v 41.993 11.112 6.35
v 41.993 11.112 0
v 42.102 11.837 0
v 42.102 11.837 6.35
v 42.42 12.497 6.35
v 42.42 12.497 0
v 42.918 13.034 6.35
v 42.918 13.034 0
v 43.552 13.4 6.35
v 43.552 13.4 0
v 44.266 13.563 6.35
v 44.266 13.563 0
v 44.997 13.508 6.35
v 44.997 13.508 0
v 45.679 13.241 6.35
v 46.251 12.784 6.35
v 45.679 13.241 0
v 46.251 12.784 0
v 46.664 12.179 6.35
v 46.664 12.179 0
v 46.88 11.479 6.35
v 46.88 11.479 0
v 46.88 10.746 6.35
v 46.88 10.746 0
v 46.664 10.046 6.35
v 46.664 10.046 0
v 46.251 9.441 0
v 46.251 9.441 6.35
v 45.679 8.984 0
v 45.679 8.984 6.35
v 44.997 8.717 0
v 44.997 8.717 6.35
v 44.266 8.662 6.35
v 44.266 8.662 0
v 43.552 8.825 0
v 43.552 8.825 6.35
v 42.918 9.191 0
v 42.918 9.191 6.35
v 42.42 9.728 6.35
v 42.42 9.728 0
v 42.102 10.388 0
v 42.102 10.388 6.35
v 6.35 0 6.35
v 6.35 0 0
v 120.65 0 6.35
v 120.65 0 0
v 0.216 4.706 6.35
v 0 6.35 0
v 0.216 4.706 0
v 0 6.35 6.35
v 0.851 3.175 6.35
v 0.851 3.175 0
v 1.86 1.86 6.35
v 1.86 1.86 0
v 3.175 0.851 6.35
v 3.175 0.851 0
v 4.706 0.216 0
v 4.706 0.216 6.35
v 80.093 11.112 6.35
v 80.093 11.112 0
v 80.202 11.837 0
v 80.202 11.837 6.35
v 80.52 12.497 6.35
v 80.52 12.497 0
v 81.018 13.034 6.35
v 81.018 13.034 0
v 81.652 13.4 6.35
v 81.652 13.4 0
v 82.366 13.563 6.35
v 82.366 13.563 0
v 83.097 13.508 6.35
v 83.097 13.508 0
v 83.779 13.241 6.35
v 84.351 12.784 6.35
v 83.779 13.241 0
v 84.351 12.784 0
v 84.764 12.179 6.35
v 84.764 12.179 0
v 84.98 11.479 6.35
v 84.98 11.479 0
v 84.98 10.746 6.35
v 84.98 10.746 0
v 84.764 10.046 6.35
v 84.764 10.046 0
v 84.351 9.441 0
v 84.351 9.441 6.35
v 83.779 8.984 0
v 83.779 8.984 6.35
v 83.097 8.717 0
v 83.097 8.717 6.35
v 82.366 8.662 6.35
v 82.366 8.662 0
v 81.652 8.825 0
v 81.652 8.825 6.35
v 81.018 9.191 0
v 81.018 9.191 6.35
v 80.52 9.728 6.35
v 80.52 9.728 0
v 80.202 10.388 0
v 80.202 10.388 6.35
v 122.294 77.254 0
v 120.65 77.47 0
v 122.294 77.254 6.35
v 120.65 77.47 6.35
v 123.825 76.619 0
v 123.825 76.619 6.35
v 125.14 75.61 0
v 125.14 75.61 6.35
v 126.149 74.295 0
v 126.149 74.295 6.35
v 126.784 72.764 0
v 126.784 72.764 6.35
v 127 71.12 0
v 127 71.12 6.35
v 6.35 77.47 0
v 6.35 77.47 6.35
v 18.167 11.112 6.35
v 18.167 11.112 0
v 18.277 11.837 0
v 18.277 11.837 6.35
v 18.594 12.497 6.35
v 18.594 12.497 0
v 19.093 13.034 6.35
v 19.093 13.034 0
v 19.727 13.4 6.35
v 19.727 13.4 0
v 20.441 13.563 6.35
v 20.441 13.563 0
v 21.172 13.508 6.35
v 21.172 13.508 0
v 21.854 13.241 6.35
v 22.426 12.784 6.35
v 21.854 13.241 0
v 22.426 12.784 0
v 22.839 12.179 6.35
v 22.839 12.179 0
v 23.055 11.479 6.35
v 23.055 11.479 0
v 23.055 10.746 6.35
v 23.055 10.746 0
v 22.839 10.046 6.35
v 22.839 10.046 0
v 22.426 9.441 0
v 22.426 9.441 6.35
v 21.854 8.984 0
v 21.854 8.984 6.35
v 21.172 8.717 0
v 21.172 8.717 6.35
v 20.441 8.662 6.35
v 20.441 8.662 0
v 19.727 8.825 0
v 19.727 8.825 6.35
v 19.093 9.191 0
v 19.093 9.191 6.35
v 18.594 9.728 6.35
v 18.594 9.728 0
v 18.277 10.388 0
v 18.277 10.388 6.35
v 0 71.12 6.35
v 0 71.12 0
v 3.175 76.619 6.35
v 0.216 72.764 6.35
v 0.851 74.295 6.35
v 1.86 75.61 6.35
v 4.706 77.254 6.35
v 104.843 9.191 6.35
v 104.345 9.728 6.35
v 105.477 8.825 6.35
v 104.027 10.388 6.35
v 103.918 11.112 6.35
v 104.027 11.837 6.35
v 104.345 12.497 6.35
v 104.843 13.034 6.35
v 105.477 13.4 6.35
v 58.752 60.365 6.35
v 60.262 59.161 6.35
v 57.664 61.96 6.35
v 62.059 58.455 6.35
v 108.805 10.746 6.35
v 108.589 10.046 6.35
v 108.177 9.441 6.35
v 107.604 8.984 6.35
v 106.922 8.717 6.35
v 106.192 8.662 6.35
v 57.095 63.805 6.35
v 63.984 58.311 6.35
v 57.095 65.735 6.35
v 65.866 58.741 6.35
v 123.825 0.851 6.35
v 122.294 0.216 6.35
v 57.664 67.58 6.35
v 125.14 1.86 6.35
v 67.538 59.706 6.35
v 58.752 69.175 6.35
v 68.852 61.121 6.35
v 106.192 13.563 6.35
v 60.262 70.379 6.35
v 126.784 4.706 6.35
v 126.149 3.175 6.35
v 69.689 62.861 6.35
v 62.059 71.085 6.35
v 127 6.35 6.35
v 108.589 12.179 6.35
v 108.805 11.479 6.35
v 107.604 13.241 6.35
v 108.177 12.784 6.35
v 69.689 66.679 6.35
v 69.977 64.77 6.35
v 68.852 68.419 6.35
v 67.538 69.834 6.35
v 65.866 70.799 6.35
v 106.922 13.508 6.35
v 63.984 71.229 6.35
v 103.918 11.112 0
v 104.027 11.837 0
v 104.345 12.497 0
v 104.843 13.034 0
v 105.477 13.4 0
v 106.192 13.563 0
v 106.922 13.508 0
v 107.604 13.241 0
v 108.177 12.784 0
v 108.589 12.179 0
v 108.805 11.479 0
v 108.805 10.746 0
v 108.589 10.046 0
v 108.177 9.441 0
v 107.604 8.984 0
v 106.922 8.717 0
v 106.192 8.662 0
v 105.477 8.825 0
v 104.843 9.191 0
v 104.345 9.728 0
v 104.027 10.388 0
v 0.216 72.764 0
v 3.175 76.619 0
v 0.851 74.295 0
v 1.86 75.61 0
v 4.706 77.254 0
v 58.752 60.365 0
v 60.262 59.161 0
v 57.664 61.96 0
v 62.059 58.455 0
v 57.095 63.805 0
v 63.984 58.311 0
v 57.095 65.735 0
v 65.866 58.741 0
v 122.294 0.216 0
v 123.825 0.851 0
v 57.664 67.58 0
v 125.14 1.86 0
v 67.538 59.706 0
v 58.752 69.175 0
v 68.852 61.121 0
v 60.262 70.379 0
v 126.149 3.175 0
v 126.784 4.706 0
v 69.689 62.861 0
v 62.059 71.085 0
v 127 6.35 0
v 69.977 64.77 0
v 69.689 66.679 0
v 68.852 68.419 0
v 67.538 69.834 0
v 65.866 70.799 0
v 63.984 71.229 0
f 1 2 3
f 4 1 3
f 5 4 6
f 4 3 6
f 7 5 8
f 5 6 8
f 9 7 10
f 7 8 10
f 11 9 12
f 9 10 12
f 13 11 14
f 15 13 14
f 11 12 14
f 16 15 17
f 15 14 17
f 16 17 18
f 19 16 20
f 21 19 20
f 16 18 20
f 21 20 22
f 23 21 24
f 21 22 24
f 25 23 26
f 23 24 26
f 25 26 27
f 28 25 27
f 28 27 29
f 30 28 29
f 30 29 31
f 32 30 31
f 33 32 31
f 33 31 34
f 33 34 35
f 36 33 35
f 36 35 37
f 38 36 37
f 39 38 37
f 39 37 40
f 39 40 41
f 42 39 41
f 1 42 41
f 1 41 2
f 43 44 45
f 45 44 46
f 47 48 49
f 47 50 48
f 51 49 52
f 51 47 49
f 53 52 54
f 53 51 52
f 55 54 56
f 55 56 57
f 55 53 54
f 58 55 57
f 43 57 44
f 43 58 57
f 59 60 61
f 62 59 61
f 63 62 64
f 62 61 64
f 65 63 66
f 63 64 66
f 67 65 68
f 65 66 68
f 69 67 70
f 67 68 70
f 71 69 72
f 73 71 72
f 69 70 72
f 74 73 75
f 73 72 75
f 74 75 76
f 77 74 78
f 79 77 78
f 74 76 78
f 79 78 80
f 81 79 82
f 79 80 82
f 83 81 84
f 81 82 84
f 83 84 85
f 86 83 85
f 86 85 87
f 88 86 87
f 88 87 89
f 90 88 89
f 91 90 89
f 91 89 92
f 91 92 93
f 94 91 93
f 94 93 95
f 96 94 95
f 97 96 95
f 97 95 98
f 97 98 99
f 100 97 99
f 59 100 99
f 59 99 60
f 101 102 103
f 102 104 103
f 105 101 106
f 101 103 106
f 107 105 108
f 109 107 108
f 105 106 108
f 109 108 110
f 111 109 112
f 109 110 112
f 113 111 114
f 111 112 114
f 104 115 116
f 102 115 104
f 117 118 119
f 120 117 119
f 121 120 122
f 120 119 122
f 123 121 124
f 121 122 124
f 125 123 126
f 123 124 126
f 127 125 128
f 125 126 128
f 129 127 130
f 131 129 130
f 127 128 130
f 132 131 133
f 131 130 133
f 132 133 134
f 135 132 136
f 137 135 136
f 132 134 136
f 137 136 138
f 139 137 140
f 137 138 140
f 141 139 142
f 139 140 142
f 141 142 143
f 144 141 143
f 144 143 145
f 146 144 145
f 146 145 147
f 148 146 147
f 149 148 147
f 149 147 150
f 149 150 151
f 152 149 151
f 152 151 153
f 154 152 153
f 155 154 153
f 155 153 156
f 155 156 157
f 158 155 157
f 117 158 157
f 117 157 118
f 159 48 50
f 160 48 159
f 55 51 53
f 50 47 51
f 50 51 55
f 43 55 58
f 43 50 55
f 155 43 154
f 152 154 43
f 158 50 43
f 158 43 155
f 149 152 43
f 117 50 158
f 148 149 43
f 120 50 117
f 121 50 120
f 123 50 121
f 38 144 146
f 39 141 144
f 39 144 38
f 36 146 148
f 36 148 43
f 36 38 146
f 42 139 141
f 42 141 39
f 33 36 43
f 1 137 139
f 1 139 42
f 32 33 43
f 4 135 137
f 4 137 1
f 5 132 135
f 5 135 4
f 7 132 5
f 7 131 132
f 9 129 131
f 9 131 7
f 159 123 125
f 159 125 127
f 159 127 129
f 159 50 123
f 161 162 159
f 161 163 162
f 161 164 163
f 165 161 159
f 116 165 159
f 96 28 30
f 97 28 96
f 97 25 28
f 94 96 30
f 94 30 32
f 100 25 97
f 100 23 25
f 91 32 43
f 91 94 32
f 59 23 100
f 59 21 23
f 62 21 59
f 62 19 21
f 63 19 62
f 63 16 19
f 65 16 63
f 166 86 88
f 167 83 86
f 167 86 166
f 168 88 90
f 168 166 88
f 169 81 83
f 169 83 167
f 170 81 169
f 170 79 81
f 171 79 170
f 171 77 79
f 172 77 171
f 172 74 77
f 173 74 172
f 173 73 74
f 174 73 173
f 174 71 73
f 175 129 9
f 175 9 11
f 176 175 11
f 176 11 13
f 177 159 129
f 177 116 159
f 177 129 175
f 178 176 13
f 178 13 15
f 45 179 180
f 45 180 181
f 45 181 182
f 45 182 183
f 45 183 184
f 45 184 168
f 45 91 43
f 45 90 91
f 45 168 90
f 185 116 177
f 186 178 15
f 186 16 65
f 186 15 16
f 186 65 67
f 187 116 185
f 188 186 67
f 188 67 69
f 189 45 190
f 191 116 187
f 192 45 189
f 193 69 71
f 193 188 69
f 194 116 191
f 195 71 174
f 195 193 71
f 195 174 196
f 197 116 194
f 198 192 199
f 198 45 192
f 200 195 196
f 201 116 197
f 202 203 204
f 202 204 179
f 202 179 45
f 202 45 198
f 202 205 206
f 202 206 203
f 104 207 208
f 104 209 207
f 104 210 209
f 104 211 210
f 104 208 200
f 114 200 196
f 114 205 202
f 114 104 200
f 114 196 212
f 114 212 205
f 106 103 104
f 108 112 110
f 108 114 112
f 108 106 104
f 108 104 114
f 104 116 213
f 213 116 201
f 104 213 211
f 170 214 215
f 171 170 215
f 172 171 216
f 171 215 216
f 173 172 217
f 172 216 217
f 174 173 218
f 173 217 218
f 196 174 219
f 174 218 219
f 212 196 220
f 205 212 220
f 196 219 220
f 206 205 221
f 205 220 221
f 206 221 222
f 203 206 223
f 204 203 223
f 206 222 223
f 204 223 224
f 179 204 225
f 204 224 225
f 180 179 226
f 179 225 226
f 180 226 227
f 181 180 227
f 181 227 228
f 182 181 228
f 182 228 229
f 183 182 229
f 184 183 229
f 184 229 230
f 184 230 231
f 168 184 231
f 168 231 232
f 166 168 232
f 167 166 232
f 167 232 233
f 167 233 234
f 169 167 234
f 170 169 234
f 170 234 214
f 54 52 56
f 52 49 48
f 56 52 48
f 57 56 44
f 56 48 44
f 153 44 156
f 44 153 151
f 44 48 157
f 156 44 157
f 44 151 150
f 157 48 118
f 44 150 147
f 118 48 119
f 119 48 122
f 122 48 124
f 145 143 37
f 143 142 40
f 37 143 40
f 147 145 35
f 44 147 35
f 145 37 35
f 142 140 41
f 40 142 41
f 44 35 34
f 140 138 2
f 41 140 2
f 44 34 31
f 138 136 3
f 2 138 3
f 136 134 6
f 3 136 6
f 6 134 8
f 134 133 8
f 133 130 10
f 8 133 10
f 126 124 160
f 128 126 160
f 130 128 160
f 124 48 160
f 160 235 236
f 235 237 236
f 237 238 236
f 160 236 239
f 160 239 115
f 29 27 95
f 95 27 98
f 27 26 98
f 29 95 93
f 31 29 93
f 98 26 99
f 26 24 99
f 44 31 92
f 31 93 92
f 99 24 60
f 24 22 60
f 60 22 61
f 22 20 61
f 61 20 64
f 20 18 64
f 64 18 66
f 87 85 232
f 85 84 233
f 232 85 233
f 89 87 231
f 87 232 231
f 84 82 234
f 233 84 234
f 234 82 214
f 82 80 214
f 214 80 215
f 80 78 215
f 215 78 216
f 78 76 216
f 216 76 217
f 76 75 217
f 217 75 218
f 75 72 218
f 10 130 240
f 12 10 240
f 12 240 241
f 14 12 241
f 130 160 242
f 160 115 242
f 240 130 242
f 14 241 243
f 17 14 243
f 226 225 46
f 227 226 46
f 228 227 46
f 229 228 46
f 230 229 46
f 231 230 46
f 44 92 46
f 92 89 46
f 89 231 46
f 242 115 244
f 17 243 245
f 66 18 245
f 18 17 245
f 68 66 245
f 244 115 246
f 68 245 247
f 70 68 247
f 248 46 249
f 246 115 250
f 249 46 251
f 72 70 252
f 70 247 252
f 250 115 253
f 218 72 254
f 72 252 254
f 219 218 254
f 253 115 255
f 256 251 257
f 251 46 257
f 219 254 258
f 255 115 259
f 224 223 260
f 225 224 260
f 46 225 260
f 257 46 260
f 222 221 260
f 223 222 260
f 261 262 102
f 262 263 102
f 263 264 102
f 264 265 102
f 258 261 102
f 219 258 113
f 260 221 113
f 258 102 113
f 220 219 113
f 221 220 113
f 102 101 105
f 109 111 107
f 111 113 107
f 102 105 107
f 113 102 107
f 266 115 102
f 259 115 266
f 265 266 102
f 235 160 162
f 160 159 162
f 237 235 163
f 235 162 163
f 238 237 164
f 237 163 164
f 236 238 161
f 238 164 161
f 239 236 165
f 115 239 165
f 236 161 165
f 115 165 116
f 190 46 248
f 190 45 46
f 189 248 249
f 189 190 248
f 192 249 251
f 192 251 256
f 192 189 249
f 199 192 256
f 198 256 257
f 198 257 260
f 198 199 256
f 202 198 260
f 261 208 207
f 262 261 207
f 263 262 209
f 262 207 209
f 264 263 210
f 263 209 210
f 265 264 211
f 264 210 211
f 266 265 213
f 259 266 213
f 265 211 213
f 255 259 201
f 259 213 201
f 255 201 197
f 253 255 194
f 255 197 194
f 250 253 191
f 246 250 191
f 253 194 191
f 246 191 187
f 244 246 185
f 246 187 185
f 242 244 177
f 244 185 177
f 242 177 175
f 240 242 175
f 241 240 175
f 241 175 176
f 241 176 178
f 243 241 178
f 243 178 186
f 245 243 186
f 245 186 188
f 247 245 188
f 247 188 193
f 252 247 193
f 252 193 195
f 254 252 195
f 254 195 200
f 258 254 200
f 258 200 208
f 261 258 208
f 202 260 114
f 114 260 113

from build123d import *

# Parameters (mm, degrees)
SKETCH1_W             = 127
SKETCH1_H             = 77.47
BOSS_EXTRUDE1_DEPTH   = 6.35
F_8_CLEARANCE_HOLE1_D = 4.9149
FILLET1_R             = 6.35
SKETCH8_R             = 6.477
CUT_EXTRUDE1_DEPTH    = 149.899037606


with BuildPart() as part:
    # Sketch1 → Boss-Extrude1 (new body)
    with BuildSketch(Plane.XY):
        with Locations((63.5, 38.735)):
            Rectangle(SKETCH1_W, SKETCH1_H)
    extrude(amount=BOSS_EXTRUDE1_DEPTH)

    # #8 Clearance Hole1 (through all)
    with Locations(Plane.XY.offset(6.35)):
        with Locations((20.6248, 11.1125), (44.45, 11.1125), (82.55, 11.1125), (106.3752, 11.1125)):
            Hole(F_8_CLEARANCE_HOLE1_D / 2)

    # Fillet1
    fillet1_edges = [part.edges().sort_by_distance(p)[0] for p in [
        (0, 77.47, 3.175),
        (127, 77.47, 3.175),
        (127, 0, 3.175),
        (0, 0, 3.175),
    ]]
    fillet(fillet1_edges, radius=FILLET1_R)

    # Sketch8 → Cut-Extrude1 (cut, through all)
    with BuildSketch(Plane.XY.offset(6.35)):
        with Locations((63.5, 64.77)):
            Circle(SKETCH8_R)
    extrude(amount=-CUT_EXTRUDE1_DEPTH, mode=Mode.SUBTRACT)


solid = part.part
